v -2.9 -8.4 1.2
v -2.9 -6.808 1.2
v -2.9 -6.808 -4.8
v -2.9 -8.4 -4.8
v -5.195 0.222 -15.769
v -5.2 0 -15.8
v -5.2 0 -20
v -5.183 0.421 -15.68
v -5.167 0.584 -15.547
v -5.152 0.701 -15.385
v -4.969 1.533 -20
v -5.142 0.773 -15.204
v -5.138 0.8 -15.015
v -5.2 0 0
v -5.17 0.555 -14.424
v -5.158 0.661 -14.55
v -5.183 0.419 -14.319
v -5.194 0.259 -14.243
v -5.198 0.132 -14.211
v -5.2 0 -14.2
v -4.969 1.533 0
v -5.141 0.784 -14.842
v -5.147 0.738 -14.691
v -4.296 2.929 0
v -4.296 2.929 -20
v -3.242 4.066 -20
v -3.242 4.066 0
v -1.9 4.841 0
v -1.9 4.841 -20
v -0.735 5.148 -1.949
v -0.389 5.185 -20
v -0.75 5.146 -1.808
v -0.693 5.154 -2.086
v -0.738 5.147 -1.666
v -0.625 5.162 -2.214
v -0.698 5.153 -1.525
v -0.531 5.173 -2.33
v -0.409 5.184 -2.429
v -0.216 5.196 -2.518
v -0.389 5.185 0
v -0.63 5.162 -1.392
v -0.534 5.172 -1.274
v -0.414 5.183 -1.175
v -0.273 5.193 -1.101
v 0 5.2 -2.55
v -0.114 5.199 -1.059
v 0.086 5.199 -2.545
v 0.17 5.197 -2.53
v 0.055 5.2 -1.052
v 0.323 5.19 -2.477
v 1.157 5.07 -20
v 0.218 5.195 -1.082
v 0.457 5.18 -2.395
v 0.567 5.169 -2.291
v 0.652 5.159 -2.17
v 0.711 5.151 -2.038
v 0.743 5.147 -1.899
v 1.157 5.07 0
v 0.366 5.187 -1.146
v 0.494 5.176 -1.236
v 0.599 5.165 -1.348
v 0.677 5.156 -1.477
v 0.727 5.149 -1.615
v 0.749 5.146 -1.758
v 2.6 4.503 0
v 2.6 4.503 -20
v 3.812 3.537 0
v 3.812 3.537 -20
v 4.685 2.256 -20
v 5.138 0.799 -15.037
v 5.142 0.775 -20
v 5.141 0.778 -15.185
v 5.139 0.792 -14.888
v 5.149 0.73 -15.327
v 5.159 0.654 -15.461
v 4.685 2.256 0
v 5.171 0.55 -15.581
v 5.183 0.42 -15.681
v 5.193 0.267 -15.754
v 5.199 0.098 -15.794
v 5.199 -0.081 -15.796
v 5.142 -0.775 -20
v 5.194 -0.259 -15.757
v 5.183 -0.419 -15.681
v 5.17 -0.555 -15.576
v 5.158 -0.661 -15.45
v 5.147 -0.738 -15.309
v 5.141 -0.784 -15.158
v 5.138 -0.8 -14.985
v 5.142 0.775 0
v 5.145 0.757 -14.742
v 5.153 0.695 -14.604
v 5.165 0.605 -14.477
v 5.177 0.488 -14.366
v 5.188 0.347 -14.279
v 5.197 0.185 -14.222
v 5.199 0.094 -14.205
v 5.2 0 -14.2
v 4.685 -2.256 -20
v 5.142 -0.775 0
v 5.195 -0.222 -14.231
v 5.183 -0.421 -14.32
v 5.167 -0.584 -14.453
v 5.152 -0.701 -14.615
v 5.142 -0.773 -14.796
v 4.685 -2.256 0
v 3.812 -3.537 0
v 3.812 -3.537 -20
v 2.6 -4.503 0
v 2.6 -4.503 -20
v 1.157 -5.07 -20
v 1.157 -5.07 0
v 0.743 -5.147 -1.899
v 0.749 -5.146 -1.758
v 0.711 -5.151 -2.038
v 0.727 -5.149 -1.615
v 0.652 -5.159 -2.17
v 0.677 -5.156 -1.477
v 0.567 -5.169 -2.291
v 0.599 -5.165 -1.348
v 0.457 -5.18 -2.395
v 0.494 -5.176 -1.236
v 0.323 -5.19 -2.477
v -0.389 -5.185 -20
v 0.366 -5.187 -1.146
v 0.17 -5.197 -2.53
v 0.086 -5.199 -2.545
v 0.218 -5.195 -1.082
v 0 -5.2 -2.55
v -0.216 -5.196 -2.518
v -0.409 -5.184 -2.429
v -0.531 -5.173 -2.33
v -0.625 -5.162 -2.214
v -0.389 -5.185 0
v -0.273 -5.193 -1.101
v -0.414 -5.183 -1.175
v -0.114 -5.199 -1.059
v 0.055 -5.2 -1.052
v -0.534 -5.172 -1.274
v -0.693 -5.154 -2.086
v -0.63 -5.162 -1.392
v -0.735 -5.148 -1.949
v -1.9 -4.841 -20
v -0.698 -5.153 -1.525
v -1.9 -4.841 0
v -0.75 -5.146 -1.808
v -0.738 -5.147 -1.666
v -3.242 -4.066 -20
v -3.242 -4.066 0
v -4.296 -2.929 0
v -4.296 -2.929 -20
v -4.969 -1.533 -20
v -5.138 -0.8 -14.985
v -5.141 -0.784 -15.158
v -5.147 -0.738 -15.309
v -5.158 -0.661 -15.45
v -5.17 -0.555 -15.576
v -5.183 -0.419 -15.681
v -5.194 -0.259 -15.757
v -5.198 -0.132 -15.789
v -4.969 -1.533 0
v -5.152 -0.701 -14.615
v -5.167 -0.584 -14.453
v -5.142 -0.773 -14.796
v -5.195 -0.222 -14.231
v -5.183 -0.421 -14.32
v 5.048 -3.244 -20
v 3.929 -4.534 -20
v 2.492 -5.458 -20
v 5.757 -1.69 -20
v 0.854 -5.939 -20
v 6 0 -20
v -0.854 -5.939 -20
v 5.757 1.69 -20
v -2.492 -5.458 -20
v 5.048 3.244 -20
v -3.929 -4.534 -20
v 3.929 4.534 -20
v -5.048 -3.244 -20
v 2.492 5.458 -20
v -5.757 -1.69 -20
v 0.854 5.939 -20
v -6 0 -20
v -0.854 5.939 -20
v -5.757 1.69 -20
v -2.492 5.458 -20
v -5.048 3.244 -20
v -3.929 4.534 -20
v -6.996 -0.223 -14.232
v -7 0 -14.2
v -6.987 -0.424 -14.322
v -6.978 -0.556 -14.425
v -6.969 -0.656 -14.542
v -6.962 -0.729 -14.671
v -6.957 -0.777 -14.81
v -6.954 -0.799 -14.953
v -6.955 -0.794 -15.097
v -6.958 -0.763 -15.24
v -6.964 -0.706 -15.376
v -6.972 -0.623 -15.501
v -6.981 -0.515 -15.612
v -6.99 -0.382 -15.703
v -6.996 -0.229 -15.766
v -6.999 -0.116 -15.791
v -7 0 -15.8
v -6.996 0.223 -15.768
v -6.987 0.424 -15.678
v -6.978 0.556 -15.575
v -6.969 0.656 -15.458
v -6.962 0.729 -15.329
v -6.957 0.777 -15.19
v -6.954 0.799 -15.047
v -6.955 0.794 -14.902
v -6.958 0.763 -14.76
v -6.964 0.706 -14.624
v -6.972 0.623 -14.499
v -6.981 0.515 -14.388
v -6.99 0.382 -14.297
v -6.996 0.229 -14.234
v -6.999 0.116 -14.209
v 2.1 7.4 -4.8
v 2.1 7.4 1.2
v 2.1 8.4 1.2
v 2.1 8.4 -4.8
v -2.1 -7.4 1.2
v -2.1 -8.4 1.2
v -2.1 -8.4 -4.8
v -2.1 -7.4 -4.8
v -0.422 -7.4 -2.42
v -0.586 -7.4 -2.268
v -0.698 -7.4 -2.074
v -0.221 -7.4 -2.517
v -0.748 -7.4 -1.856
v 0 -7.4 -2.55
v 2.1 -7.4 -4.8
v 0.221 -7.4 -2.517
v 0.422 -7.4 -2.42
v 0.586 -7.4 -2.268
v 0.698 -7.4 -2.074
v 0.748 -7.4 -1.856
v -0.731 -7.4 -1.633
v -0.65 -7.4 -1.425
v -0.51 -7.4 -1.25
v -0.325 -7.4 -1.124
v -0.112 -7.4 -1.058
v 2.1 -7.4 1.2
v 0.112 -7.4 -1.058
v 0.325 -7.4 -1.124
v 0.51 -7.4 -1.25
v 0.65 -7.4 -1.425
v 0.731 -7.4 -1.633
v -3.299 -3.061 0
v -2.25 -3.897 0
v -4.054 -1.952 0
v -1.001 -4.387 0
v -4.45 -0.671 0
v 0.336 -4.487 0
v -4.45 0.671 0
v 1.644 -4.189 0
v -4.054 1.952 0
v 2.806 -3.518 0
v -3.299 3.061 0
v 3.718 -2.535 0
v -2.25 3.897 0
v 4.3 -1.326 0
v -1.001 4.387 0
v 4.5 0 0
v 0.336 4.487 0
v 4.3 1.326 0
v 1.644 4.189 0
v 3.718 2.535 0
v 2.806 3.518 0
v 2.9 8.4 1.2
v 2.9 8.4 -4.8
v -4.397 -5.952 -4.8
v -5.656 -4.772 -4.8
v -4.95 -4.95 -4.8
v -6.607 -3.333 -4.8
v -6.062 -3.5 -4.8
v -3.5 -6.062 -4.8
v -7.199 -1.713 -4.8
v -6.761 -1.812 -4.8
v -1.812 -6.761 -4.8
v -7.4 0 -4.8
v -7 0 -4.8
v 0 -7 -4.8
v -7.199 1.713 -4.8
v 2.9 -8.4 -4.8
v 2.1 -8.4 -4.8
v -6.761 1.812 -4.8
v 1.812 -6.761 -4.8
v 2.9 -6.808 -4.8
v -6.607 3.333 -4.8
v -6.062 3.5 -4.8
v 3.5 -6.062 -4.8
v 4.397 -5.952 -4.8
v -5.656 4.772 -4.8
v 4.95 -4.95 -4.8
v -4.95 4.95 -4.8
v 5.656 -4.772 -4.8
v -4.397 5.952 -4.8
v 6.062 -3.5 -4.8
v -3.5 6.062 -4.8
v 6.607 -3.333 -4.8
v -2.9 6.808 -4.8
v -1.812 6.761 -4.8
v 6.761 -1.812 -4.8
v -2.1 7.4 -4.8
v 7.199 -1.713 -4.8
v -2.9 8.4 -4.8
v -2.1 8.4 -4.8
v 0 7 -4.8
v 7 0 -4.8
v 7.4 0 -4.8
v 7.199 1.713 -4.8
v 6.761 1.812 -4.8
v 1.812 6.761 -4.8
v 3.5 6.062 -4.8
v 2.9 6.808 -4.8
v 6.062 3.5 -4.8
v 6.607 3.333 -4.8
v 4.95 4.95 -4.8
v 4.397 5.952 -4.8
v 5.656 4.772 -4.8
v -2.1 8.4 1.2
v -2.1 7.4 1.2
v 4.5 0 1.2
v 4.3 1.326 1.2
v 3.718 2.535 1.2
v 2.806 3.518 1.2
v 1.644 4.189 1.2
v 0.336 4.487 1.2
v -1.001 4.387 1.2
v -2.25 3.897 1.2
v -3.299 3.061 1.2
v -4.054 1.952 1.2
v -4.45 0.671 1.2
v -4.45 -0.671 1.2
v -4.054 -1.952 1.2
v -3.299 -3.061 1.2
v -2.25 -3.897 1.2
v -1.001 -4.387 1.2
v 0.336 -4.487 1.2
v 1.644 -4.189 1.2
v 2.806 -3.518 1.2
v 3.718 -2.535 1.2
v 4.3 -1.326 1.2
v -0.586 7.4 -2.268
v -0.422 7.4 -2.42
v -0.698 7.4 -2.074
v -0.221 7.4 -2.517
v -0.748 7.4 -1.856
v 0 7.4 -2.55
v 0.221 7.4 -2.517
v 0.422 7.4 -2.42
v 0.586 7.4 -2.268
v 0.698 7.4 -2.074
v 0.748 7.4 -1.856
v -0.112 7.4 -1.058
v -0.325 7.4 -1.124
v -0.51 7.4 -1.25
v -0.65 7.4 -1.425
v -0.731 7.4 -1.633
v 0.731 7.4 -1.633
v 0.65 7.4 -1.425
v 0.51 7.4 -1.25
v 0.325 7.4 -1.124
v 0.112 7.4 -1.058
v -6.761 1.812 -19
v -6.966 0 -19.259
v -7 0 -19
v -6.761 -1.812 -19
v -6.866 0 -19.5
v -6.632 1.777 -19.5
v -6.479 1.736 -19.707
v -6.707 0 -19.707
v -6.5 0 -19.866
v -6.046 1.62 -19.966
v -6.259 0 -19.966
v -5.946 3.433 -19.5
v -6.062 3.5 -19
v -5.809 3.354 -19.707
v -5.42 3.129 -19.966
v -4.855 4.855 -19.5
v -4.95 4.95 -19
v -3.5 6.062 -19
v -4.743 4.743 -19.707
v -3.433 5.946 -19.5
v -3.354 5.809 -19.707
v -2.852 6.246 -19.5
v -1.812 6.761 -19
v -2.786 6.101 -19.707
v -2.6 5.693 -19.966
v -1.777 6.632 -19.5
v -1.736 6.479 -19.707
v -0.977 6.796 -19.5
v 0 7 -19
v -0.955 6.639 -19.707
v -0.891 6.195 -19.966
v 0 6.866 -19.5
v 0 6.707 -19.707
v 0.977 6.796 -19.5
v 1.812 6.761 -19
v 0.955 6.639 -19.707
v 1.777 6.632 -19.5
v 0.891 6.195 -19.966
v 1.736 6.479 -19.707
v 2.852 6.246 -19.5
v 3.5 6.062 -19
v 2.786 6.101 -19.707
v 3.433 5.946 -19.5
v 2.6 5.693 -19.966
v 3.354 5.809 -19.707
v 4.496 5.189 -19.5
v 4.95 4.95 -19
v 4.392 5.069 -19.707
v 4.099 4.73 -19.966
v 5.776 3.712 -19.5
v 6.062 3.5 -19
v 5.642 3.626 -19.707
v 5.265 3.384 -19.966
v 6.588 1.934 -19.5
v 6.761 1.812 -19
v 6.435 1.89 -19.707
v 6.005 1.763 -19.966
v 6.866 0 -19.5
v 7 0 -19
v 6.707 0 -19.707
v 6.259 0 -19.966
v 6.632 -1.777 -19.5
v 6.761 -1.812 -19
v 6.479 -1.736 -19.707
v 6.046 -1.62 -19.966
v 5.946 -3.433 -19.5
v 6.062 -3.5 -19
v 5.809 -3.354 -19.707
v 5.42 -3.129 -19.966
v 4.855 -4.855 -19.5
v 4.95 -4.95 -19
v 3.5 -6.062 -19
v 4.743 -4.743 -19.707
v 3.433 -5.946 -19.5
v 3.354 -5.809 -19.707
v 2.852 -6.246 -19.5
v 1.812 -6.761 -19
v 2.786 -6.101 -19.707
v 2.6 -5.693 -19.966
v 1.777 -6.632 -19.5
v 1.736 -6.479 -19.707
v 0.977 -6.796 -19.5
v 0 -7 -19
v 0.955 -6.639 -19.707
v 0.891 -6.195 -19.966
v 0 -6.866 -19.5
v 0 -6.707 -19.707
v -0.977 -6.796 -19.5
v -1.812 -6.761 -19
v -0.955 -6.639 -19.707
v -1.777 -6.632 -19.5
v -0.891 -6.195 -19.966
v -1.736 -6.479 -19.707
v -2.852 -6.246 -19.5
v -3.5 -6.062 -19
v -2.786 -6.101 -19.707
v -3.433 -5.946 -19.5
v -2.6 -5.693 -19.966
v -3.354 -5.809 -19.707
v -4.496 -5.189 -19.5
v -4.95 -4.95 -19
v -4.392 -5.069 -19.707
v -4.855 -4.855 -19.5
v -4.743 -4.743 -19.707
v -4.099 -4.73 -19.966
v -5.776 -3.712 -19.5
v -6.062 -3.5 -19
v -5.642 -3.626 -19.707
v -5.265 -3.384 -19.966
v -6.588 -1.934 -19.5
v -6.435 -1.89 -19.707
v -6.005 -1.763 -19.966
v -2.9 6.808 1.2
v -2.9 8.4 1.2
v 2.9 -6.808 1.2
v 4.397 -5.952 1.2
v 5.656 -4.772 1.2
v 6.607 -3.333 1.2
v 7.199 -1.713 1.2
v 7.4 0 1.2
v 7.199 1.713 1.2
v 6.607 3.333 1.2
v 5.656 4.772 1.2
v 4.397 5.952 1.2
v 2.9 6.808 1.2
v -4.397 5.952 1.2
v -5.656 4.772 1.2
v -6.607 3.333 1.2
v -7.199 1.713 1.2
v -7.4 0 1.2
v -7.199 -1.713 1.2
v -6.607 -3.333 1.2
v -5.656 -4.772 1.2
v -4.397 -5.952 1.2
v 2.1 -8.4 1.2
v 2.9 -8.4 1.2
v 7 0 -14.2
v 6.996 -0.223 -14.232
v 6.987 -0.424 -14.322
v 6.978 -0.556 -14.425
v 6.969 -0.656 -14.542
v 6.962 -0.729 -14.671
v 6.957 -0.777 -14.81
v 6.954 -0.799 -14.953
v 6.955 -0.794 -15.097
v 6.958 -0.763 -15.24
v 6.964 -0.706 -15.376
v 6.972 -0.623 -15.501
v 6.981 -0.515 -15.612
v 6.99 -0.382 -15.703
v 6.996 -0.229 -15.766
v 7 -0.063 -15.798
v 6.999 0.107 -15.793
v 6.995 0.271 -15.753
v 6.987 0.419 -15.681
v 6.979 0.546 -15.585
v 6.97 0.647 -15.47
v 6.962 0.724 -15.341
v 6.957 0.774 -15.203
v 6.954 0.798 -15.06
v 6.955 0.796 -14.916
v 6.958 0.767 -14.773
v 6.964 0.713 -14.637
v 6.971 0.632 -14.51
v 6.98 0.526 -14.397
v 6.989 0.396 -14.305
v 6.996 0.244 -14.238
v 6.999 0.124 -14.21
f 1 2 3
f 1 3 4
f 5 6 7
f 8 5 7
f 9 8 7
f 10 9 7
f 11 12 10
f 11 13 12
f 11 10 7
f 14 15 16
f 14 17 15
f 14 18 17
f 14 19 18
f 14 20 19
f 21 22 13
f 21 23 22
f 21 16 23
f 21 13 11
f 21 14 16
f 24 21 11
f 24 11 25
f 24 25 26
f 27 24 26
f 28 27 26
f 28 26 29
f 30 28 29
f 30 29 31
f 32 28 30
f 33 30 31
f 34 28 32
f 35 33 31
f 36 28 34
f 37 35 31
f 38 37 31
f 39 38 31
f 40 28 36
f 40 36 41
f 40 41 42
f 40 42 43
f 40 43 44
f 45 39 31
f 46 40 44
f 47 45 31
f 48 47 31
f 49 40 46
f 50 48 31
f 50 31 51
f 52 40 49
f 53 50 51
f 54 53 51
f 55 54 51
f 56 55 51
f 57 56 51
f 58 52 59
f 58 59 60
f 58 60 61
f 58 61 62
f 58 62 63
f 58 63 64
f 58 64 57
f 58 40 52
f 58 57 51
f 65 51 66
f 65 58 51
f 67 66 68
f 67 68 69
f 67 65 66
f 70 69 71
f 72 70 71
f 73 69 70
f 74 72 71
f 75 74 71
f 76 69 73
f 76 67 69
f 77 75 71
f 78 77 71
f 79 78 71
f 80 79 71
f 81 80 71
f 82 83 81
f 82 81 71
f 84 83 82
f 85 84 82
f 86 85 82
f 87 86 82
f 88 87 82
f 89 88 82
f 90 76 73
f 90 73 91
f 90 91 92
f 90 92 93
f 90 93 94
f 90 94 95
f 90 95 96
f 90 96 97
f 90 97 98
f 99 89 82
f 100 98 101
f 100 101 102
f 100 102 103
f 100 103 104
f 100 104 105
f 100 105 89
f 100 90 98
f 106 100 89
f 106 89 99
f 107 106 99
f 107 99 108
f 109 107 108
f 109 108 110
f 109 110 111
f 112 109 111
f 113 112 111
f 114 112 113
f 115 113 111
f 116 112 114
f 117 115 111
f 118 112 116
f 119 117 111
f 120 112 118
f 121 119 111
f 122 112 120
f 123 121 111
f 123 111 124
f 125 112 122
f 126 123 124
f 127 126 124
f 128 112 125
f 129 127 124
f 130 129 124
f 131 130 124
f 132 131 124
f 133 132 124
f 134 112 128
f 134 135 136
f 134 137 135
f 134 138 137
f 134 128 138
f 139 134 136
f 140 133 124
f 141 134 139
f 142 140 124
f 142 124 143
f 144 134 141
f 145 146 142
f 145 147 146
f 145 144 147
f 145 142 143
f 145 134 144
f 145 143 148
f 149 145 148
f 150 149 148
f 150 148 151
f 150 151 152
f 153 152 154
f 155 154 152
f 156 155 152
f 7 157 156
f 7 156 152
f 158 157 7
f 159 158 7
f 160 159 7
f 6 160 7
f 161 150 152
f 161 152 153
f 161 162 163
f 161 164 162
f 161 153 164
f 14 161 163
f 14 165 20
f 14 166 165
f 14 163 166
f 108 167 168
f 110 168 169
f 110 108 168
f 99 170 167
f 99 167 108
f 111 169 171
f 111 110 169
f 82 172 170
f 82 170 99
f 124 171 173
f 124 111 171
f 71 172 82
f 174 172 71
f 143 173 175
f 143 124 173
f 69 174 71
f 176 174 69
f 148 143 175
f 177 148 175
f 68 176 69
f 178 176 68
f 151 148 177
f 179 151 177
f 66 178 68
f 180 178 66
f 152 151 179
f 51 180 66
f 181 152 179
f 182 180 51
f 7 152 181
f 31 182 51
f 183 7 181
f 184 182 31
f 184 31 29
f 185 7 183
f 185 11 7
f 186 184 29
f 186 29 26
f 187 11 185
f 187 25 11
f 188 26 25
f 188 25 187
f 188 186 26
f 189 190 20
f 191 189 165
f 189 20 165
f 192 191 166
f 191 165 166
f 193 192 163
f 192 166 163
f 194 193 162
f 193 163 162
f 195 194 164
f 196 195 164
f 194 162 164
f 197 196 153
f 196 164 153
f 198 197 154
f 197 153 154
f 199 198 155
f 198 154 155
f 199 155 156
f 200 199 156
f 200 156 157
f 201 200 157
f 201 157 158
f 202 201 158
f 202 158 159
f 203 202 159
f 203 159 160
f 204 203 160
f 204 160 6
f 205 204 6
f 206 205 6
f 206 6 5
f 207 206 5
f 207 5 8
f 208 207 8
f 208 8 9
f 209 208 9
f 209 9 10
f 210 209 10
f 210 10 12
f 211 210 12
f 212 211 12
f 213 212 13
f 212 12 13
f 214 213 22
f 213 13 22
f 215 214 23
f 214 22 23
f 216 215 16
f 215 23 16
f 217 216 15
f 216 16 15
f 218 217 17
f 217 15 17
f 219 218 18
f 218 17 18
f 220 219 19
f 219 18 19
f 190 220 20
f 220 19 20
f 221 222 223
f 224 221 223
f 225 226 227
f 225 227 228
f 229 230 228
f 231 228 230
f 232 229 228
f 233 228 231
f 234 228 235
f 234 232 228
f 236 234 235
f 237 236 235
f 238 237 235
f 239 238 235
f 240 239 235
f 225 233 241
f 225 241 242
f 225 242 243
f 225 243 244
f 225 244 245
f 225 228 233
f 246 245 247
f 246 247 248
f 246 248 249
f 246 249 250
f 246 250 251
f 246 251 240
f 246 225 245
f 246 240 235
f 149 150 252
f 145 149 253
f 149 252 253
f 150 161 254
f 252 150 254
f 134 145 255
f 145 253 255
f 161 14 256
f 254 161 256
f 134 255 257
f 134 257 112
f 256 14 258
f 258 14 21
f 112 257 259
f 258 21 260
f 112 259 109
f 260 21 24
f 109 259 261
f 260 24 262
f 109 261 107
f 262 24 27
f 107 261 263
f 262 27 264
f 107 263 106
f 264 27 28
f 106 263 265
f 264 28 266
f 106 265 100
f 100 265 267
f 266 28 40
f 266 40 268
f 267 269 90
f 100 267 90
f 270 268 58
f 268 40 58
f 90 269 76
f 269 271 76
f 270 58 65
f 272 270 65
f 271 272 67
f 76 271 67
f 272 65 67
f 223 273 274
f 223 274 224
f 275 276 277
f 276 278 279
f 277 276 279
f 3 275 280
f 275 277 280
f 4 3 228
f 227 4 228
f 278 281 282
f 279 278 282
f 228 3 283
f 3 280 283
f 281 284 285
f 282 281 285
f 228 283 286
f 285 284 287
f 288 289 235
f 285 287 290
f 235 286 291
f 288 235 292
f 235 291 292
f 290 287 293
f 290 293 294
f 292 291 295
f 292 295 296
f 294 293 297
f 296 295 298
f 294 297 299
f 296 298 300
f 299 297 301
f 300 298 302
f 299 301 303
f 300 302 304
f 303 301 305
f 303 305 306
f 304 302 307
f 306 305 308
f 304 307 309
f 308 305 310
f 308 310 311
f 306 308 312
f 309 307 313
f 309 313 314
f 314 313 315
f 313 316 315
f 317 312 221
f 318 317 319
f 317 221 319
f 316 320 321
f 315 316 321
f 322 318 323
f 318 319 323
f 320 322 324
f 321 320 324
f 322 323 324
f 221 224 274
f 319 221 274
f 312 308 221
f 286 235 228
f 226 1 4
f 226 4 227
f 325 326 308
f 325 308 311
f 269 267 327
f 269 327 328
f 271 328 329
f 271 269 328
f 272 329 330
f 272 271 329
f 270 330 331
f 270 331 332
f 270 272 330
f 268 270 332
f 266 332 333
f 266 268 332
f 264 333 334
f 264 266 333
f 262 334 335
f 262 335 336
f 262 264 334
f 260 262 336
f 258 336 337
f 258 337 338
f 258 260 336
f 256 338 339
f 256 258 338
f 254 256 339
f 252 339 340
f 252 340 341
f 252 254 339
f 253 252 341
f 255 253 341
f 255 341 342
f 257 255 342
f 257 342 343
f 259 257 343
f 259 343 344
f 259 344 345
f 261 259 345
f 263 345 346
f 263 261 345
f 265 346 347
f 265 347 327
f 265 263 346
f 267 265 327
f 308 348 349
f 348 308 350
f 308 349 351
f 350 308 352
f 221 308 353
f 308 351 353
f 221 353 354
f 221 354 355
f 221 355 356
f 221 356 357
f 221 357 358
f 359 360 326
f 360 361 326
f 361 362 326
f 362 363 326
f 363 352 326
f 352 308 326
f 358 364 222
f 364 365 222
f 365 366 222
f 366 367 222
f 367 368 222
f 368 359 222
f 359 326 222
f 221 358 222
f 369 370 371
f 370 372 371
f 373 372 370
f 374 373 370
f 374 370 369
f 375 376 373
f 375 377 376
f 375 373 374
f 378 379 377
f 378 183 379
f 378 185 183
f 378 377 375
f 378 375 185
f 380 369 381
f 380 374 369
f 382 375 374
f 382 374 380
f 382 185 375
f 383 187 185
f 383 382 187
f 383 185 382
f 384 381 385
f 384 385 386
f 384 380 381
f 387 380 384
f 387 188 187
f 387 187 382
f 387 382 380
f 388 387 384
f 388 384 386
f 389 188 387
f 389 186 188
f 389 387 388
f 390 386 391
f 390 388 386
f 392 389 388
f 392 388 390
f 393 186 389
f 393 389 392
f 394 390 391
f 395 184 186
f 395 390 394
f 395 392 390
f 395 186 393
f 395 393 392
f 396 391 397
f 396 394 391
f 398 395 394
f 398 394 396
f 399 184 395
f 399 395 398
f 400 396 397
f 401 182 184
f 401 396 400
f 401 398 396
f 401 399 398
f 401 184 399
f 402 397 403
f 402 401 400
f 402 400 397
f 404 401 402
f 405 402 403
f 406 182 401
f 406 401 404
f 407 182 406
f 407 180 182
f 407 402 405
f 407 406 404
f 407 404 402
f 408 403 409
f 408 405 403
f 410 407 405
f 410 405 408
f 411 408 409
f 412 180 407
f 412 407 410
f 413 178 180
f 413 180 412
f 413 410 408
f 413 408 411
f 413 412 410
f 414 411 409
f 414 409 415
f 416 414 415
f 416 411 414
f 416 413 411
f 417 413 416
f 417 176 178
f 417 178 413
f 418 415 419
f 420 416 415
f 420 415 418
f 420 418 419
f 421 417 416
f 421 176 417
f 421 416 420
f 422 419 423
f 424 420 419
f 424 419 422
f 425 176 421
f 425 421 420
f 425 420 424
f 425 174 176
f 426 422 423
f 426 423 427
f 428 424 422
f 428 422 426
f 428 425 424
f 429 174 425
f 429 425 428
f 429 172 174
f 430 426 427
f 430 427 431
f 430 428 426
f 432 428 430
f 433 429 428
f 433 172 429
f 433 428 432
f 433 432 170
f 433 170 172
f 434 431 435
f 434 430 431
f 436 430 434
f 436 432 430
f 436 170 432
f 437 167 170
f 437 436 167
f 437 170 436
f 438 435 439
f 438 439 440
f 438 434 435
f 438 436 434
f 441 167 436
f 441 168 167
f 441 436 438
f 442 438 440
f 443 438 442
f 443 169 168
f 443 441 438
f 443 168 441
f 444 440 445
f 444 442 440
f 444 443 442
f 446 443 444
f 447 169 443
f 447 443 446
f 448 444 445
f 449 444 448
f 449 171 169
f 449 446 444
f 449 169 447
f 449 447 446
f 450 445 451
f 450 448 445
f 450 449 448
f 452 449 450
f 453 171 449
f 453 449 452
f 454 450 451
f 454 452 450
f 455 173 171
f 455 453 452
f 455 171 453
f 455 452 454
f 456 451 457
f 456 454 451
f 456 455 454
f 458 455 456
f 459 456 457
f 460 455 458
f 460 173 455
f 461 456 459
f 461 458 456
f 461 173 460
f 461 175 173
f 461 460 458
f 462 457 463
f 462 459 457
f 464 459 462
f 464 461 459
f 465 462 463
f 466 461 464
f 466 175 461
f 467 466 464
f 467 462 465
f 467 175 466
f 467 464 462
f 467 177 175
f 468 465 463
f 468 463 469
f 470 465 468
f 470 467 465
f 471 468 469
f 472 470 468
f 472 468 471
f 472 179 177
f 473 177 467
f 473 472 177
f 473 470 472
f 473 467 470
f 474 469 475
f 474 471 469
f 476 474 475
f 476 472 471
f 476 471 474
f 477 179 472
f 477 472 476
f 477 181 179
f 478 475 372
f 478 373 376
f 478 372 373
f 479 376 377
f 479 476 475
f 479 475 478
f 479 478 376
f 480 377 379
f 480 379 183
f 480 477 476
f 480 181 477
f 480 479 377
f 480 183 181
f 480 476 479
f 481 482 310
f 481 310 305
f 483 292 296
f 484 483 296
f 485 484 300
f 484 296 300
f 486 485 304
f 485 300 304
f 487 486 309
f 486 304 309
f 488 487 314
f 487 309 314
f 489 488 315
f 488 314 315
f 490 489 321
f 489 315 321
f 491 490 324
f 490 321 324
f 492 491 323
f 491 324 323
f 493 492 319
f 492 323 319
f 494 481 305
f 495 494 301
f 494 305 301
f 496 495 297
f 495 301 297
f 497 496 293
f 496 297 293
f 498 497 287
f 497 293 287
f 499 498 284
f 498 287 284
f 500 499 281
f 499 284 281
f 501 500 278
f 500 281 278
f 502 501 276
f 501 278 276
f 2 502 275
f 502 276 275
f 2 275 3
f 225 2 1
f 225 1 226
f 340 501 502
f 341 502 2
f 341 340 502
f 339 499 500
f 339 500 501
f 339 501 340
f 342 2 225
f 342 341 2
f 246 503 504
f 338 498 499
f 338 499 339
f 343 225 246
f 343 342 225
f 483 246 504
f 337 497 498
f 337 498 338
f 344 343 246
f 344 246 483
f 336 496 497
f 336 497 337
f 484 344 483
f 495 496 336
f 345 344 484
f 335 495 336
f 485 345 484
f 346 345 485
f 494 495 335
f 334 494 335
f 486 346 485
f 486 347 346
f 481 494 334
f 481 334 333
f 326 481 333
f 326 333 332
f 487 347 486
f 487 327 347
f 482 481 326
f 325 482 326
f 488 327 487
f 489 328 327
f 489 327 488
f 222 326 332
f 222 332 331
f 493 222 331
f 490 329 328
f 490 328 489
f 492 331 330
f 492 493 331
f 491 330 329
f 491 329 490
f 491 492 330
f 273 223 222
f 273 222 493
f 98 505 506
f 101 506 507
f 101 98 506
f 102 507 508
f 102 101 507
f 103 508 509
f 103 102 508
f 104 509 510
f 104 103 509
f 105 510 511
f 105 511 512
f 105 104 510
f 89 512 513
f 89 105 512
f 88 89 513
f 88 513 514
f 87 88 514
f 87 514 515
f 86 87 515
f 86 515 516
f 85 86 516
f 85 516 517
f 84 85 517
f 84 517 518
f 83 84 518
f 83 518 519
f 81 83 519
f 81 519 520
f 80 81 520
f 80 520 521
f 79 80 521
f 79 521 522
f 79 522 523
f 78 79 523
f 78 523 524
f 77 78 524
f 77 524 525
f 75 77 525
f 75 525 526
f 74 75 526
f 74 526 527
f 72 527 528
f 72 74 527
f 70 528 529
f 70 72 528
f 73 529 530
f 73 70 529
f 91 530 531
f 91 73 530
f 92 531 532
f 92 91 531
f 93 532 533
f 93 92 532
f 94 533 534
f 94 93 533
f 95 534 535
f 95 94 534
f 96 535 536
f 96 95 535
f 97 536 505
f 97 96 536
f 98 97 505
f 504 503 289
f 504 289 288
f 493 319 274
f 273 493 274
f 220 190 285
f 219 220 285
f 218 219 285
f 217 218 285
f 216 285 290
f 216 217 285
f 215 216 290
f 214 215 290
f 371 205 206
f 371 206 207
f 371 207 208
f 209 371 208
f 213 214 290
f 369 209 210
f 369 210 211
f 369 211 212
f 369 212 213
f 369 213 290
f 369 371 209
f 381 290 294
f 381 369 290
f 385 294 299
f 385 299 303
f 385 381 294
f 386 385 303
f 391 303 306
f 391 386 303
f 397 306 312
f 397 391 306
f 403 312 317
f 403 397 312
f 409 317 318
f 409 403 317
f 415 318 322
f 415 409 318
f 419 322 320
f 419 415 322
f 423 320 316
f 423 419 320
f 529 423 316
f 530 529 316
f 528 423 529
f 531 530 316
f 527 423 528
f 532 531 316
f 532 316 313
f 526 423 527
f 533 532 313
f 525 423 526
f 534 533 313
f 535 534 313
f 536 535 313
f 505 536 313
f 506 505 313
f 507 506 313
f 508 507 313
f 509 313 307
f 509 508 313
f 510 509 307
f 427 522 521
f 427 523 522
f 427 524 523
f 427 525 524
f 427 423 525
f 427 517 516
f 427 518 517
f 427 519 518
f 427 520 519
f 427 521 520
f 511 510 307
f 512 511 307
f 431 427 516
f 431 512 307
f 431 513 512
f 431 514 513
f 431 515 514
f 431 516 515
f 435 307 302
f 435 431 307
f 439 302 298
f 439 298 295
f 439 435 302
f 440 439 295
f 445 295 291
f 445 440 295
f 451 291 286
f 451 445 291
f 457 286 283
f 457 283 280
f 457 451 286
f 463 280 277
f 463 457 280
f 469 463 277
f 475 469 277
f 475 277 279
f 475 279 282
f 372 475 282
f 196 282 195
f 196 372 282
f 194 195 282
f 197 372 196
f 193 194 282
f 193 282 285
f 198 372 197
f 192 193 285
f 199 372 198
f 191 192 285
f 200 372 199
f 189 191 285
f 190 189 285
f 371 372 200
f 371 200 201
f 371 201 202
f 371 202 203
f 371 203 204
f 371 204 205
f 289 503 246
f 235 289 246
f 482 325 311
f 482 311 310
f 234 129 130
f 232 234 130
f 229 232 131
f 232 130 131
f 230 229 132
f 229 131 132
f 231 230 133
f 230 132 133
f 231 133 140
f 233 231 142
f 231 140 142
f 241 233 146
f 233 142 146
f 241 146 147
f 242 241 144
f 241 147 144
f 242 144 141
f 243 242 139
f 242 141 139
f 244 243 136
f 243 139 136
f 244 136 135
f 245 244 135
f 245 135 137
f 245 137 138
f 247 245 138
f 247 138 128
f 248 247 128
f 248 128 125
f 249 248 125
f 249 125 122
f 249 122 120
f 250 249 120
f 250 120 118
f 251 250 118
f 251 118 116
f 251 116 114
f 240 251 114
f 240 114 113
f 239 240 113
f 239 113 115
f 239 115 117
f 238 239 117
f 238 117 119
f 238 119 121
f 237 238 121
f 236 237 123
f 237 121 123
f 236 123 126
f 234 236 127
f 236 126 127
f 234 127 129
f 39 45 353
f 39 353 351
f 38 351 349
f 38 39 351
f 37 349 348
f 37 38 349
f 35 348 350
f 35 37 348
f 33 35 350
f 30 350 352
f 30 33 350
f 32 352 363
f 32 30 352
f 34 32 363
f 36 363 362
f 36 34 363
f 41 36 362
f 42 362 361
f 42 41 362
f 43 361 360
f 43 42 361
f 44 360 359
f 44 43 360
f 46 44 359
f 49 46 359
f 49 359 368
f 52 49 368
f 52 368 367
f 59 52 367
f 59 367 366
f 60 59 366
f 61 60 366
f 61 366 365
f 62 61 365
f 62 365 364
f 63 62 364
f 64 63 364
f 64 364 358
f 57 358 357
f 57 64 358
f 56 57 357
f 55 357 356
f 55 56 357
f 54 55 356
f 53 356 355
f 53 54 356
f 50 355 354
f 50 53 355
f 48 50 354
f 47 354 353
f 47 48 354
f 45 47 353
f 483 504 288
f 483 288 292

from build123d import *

# Parameters (mm, degrees)
SKETCH10_R              = 7.4
SKETCH10_R_2            = 4.5
BOSS_EXTRUDE3_DEPTH     = 1.2
SKETCH11_R              = 7.4
SKETCH11_R_2            = 5.2
BOSS_EXTRUDE4_DEPTH     = 20
BOSS_EXTRUDE5_DEPTH     = 7
SKETCH12_R              = 0.75
CUT_EXTRUDE1_DEPTH      = 10
CUT_EXTRUDE1_DEPTH_BACK = 11
SKETCH14_W              = 4.2
SKETCH14_H              = 1
CUT_EXTRUDE2_DEPTH      = 6
CUT_EXTRUDE3_REACH      = 29.148
CUT_EXTRUDE3_END_RADIUS = 7.4
CUT_EXTRUDE6_DEPTH      = 1
SKETCH16_R              = 0.8
CUT_EXTRUDE4_DEPTH      = 10
CUT_EXTRUDE4_DEPTH_BACK = 10
SKETCH19_R              = 7.4
SKETCH19_R_2            = 7
CUT_EXTRUDE7_DEPTH      = 15.2
FILLET1_R               = 1


with BuildPart() as part:
    # Sketch10 → Boss-Extrude3 (new body)
    with BuildSketch(Plane.XY):
        Circle(SKETCH10_R)
        Circle(SKETCH10_R_2, mode=Mode.SUBTRACT)
    extrude(amount=BOSS_EXTRUDE3_DEPTH)

    # Sketch11 → Boss-Extrude4 (add)
    with BuildSketch(Plane(origin=(0, 0, 0), x_dir=(-1, 0, 0), z_dir=(0, 0, -1))):
        Circle(SKETCH11_R)
        Circle(SKETCH11_R_2, mode=Mode.SUBTRACT)
    extrude(amount=BOSS_EXTRUDE4_DEPTH)

    # Sketch13 → Boss-Extrude5 (add)
    with BuildSketch(Plane.XY.offset(1.2)):
        with BuildLine():
            ThreePointArc((-2.9, 6.808083431), (0, 7.4), (2.9, 6.808083431))
            Line((2.9, 6.808083431), (2.9, 8.4))
            Line((2.9, 8.4), (-2.9, 8.4))
            Line((-2.9, 8.4), (-2.9, 6.808083431))
        make_face()
        with BuildLine():
            ThreePointArc((2.9, -6.808083431), (0, -7.4), (-2.9, -6.808083431))
            Line((-2.9, -6.808083431), (-2.9, -8.4))
            Line((-2.9, -8.4), (2.9, -8.4))
            Line((2.9, -8.4), (2.9, -6.808083431))
        make_face()
    extrude(amount=-BOSS_EXTRUDE5_DEPTH)

    # Sketch12 → Cut-Extrude1 (cut, two sides)
    with BuildSketch(Plane(origin=(0, 0, 0), x_dir=(1, 0, 0), z_dir=(0, 1, 0))) as cut_extrude1_sk:
        with Locations(Location((0, 1.8, 0), (0, 0, 90))):
            Circle(SKETCH12_R)
    extrude(amount=CUT_EXTRUDE1_DEPTH, mode=Mode.SUBTRACT)
    extrude(cut_extrude1_sk.sketch, amount=-CUT_EXTRUDE1_DEPTH_BACK, mode=Mode.SUBTRACT)

    # Sketch14 → Cut-Extrude2 (cut)
    with BuildSketch(Plane.XY.offset(1.2)):
        with Locations((0, 7.9)):
            Rectangle(SKETCH14_W, SKETCH14_H)
        with Locations((0, -7.9)):
            Rectangle(SKETCH14_W, SKETCH14_H)
    extrude(amount=-CUT_EXTRUDE2_DEPTH, mode=Mode.SUBTRACT)

    # Cut-Extrude3: up to this cylinder (the profile starts outside it)
    cut_extrude3_end = Plane(origin=(0, 0, -5.3), z_dir=(0, 0, -1)) * Cylinder(CUT_EXTRUDE3_END_RADIUS, 74.096, mode=Mode.PRIVATE)
    # Sketch15 → Cut-Extrude3 (cut, up to the surface)
    with BuildSketch(Plane(origin=(0, 8.4, 0), x_dir=(1, 0, 0), z_dir=(0, 1, 0)), mode=Mode.PRIVATE) as cut_extrude3_sk1:
        Polygon((-2.9, 5.8), (-2.9, 4.8), (-2.1, 4.8), (2.1, 4.8), (2.9, 4.8), (2.9, 5.8), align=None)
    cut_extrude3_tool1 = extrude(cut_extrude3_sk1.sketch, amount=-CUT_EXTRUDE3_REACH, mode=Mode.PRIVATE) - cut_extrude3_end
    add(cut_extrude3_tool1.solids().sort_by_distance((0, 8.4, -5.3))[0], mode=Mode.SUBTRACT)

    # Sketch18 → Cut-Extrude6 (cut)
    with BuildSketch(Plane(origin=(0, 0, -5.8), x_dir=(-1, 0, 0), z_dir=(0, 0, -1))):
        with BuildLine():
            Line((-2.9, -6.808083431), (-2.9, -8.4))
            Line((-2.9, -8.4), (2.9, -8.4))
            Line((2.9, -8.4), (2.9, -6.808083431))
            ThreePointArc((2.9, -6.808083431), (0, -7.4), (-2.9, -6.808083431))
        make_face()
    extrude(amount=-CUT_EXTRUDE6_DEPTH, mode=Mode.SUBTRACT)

    # Sketch16 → Cut-Extrude4 (cut, two sides)
    with BuildSketch(Plane(origin=(0, 0, 0), x_dir=(0, 0, -1), z_dir=(1, 0, 0))) as cut_extrude4_sk:
        with Locations(Location((15, 0, 0), (0, 0, 180))):
            Circle(SKETCH16_R)
    extrude(amount=CUT_EXTRUDE4_DEPTH, mode=Mode.SUBTRACT)
    extrude(cut_extrude4_sk.sketch, amount=-CUT_EXTRUDE4_DEPTH_BACK, mode=Mode.SUBTRACT)

    # Sketch19 → Cut-Extrude7 (cut)
    with BuildSketch(Plane(origin=(0, 0, -20), x_dir=(-1, 0, 0), z_dir=(0, 0, -1))):
        Circle(SKETCH19_R)
        Circle(SKETCH19_R_2, mode=Mode.SUBTRACT)
    extrude(amount=-CUT_EXTRUDE7_DEPTH, mode=Mode.SUBTRACT)

    # Fillet1
    fillet1_edges = [part.edges().sort_by_distance(p)[0] for p in [
        (7, 0, -20),
    ]]
    fillet(fillet1_edges, radius=FILLET1_R)


solid = part.part
